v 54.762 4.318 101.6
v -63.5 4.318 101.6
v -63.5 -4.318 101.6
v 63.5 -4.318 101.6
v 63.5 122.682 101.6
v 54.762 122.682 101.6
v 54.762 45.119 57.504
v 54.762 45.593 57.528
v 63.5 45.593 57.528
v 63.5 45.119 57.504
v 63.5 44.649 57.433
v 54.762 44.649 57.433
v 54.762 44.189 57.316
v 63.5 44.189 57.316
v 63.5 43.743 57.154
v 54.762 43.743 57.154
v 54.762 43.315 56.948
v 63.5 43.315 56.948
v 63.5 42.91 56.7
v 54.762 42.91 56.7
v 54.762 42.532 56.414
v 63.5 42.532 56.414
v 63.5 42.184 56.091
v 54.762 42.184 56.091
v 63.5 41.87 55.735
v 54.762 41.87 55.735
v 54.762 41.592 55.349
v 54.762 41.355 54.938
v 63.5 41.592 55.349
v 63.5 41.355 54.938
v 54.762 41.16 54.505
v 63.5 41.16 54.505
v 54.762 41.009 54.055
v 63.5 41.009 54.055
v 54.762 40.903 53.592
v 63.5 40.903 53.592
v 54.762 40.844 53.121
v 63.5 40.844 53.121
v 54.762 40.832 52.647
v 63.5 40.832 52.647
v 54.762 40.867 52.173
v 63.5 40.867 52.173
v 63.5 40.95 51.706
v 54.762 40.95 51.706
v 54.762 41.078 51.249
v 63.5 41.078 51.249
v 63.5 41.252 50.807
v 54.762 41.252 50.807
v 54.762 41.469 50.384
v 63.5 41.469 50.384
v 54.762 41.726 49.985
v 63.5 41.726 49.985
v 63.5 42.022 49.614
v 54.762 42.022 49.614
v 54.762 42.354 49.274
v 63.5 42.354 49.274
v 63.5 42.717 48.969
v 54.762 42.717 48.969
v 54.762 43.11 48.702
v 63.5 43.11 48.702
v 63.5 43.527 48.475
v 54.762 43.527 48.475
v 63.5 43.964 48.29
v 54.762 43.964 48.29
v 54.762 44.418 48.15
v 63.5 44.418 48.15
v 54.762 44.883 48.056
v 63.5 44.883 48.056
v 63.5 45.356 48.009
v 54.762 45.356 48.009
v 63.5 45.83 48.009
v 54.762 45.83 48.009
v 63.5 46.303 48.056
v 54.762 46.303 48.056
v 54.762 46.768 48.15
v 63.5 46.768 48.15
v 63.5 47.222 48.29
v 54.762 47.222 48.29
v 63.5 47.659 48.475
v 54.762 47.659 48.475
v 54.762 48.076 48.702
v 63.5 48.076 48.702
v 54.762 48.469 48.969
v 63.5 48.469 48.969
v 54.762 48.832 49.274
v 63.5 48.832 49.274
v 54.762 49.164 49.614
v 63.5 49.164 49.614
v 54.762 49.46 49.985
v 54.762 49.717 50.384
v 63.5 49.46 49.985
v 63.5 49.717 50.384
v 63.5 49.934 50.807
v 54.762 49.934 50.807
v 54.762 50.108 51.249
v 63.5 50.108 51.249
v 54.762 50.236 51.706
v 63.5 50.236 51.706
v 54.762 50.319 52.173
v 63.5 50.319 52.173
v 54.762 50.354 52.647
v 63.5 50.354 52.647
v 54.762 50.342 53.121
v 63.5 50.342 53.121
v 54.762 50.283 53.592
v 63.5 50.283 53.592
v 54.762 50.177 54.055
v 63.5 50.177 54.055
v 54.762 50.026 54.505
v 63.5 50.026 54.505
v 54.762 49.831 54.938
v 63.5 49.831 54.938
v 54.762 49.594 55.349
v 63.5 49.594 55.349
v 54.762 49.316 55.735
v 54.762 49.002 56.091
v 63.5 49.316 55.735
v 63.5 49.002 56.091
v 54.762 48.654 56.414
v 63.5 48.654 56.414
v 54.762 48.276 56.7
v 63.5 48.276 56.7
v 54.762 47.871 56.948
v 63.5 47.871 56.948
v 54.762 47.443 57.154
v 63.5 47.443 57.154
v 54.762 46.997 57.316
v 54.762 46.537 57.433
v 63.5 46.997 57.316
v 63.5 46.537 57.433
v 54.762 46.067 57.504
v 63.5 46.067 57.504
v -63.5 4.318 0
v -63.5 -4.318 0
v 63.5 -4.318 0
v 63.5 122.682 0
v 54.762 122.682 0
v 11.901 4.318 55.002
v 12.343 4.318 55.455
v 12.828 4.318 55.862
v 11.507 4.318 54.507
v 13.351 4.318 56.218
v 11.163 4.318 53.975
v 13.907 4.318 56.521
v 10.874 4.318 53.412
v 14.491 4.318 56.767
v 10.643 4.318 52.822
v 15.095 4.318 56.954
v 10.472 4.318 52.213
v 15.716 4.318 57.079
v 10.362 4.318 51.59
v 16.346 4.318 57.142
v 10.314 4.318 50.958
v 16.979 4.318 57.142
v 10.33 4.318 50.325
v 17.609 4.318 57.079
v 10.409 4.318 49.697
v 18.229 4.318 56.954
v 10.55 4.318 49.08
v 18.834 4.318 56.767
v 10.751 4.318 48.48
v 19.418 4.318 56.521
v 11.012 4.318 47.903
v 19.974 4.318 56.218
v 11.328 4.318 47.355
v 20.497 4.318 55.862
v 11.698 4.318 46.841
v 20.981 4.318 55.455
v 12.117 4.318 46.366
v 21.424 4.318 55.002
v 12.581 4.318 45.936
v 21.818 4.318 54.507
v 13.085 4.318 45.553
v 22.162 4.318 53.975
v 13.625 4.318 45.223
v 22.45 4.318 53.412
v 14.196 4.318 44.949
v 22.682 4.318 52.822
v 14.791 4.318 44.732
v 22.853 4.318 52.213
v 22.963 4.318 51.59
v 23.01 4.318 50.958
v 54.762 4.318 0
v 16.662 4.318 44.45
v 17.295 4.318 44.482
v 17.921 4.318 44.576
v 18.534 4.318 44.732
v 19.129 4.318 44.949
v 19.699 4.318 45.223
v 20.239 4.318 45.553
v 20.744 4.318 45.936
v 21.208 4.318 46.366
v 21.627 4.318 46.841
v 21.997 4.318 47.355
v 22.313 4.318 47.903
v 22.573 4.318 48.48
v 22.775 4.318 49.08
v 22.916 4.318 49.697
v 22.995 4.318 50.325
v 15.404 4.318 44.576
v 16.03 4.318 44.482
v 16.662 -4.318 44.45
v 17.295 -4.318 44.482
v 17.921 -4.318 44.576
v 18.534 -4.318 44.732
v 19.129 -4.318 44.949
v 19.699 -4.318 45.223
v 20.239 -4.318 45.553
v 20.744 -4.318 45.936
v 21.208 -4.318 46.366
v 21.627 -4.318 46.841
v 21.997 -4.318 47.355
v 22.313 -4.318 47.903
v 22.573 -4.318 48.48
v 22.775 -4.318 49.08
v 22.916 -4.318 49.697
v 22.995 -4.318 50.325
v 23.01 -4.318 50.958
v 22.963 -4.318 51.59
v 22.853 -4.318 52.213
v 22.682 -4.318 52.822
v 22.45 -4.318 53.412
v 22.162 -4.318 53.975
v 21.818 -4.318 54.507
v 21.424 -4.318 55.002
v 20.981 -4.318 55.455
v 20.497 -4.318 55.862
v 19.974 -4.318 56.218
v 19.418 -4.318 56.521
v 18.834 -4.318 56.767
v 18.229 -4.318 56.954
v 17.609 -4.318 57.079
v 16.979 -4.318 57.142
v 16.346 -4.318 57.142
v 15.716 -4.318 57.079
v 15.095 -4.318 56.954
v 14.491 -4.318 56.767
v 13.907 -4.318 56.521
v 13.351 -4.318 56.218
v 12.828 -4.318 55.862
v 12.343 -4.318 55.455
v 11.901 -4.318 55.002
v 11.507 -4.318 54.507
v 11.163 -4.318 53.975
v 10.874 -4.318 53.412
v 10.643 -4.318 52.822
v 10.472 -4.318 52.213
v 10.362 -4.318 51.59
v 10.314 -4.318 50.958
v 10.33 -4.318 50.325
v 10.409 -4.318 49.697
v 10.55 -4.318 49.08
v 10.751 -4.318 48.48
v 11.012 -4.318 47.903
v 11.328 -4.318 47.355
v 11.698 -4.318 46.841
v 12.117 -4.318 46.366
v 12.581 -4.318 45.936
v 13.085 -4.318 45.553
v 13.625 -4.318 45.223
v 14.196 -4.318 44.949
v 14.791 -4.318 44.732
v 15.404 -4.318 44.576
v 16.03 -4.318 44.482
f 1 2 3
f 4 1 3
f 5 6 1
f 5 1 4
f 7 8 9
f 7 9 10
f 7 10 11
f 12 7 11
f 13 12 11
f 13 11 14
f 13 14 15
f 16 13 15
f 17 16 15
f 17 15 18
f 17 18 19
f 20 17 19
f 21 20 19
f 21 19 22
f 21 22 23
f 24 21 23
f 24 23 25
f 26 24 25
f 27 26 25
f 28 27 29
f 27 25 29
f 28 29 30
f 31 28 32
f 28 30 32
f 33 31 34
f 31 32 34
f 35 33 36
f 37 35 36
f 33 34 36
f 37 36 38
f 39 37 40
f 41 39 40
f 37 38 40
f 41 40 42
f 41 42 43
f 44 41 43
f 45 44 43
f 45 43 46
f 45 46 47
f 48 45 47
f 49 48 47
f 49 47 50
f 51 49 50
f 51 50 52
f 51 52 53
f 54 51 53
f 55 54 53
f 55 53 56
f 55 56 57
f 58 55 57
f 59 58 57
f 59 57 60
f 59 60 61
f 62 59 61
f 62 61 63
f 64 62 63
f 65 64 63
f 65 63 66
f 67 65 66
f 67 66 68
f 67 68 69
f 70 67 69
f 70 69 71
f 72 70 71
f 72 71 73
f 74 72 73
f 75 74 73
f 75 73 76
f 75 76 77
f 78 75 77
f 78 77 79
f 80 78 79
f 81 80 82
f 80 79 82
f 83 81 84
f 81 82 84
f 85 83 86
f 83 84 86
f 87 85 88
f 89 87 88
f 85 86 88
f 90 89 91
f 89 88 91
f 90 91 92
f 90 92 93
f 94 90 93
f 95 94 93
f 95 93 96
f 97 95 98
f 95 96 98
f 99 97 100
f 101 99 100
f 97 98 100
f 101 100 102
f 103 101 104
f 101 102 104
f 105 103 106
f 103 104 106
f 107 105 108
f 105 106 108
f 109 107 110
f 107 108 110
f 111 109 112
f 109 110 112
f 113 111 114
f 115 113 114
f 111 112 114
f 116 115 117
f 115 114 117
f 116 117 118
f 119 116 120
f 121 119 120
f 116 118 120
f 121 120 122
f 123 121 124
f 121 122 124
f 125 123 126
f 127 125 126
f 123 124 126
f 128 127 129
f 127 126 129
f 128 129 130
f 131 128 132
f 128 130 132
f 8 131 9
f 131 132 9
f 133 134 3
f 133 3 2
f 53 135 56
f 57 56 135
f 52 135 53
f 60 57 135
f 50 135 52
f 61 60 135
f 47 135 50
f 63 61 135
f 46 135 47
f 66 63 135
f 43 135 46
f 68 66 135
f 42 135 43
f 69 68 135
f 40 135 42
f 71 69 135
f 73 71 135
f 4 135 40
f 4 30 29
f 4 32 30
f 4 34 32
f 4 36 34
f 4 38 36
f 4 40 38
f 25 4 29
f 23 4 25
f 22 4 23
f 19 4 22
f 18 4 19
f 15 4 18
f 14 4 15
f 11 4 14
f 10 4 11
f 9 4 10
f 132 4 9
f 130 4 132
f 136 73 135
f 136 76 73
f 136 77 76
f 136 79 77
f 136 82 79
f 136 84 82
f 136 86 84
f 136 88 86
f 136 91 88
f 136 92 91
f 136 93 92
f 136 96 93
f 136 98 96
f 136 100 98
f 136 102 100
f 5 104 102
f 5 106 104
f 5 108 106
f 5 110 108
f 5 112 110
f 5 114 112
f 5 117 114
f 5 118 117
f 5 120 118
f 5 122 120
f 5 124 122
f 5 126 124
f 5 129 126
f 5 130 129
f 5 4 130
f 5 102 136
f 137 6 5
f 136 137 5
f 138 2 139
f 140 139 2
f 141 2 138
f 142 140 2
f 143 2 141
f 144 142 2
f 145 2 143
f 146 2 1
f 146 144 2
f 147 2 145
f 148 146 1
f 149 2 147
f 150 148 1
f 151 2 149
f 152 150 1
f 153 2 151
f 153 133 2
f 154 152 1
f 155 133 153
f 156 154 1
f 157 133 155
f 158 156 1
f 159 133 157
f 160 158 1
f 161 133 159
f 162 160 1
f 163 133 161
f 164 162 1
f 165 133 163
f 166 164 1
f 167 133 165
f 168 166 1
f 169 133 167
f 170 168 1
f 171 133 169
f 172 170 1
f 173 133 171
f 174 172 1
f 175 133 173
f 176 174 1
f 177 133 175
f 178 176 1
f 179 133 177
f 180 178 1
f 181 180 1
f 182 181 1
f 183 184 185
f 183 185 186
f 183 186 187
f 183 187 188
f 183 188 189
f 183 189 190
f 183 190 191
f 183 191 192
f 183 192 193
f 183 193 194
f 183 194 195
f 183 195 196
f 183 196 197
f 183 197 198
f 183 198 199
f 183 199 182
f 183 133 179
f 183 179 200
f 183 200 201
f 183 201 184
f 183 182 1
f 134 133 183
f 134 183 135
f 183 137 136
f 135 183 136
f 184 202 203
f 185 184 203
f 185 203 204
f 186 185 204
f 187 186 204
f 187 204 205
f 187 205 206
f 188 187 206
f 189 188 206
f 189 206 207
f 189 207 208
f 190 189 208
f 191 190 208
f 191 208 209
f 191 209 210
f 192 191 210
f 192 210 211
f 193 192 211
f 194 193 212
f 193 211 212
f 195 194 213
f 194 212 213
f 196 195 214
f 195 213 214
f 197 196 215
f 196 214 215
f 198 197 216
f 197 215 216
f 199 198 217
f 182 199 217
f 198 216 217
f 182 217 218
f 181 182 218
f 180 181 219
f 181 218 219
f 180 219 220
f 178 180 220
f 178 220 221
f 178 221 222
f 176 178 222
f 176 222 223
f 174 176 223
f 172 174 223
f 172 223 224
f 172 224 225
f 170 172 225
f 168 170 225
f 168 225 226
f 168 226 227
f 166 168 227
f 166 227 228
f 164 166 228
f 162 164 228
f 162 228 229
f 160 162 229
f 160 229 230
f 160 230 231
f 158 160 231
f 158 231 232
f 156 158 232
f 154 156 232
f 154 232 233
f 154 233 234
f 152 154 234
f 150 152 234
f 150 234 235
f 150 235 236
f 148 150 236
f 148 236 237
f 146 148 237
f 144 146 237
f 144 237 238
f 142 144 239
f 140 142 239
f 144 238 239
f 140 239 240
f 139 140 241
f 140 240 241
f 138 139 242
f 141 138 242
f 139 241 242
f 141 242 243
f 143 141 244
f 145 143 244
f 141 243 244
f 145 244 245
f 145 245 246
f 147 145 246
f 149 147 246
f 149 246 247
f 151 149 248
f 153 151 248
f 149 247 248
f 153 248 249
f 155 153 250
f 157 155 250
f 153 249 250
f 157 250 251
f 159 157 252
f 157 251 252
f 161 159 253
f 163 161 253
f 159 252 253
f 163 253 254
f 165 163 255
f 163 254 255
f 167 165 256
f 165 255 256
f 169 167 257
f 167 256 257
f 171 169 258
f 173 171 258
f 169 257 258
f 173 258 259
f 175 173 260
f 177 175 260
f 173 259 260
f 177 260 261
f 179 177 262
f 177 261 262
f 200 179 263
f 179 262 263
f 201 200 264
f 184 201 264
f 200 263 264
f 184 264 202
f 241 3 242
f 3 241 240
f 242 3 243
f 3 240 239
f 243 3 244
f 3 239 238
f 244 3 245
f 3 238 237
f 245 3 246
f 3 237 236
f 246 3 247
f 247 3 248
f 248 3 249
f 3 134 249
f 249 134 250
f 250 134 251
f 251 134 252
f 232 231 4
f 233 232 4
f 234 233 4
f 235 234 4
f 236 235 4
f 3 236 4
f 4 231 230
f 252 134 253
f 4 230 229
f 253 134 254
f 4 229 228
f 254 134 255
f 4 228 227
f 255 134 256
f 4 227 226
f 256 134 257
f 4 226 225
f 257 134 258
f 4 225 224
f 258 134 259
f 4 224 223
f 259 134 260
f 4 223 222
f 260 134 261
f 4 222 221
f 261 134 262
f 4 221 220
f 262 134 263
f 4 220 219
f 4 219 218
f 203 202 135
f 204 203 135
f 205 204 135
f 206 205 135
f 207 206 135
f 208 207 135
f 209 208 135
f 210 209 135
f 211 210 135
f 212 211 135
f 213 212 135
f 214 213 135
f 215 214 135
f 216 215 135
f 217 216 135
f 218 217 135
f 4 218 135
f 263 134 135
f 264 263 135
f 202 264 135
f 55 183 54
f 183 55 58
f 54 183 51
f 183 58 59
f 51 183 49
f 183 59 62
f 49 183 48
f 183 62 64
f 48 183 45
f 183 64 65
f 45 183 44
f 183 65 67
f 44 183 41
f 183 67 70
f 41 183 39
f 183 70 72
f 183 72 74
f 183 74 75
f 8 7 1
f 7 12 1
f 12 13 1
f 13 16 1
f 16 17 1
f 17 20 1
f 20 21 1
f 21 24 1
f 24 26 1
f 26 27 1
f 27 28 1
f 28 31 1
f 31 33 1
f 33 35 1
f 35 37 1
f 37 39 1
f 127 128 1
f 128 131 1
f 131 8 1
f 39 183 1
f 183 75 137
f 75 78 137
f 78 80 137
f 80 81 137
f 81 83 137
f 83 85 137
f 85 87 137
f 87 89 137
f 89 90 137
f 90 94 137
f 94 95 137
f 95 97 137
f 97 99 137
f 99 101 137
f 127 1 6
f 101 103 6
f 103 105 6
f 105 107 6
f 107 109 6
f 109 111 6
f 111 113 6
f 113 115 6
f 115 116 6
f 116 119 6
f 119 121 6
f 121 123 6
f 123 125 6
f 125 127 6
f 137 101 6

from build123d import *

# Parameters (mm, degrees)
SKETCH1_W                  = 127
SKETCH1_H                  = 8.636
BOSS_EXTRUDE1_DEPTH        = 101.6
SKETCH3_W                  = 8.7376
SKETCH3_H                  = 118.364
BOSS_EXTRUDE2_DEPTH        = 101.6
F_1_2_0_5000_DOWEL_HOLE2_D = 12.7
F_3_8_0_3750_DOWEL_HOLE3_D = 9.525


with BuildPart() as part:
    # Sketch1 → Boss-Extrude1 (new body)
    with BuildSketch(Plane.XY):
        Rectangle(SKETCH1_W, SKETCH1_H)
    extrude(amount=BOSS_EXTRUDE1_DEPTH)

    # Sketch3 → Boss-Extrude2 (add, through all)
    with BuildSketch(Plane.XY.offset(101.6)):
        with Locations((59.1312, 63.5)):
            Rectangle(SKETCH3_W, SKETCH3_H)
    extrude(amount=-BOSS_EXTRUDE2_DEPTH)

    # 1/2 (0.5000) Dowel Hole2 (through all)
    with Locations(Plane(origin=(16.6624, 4.318, 50.8), x_dir=(0, 0, 1), z_dir=(0, 1, 0))):
        with Locations((0, 0)):
            Hole(F_1_2_0_5000_DOWEL_HOLE2_D / 2)

    # 3/8 (0.3750) Dowel Hole3 (through all)
    with Locations(Plane(origin=(54.7624, 45.593, 52.765386082), x_dir=(0, 0, -1), z_dir=(-1, 0, 0))):
        with Locations((0, 0)):
            Hole(F_3_8_0_3750_DOWEL_HOLE3_D / 2)


solid = part.part
